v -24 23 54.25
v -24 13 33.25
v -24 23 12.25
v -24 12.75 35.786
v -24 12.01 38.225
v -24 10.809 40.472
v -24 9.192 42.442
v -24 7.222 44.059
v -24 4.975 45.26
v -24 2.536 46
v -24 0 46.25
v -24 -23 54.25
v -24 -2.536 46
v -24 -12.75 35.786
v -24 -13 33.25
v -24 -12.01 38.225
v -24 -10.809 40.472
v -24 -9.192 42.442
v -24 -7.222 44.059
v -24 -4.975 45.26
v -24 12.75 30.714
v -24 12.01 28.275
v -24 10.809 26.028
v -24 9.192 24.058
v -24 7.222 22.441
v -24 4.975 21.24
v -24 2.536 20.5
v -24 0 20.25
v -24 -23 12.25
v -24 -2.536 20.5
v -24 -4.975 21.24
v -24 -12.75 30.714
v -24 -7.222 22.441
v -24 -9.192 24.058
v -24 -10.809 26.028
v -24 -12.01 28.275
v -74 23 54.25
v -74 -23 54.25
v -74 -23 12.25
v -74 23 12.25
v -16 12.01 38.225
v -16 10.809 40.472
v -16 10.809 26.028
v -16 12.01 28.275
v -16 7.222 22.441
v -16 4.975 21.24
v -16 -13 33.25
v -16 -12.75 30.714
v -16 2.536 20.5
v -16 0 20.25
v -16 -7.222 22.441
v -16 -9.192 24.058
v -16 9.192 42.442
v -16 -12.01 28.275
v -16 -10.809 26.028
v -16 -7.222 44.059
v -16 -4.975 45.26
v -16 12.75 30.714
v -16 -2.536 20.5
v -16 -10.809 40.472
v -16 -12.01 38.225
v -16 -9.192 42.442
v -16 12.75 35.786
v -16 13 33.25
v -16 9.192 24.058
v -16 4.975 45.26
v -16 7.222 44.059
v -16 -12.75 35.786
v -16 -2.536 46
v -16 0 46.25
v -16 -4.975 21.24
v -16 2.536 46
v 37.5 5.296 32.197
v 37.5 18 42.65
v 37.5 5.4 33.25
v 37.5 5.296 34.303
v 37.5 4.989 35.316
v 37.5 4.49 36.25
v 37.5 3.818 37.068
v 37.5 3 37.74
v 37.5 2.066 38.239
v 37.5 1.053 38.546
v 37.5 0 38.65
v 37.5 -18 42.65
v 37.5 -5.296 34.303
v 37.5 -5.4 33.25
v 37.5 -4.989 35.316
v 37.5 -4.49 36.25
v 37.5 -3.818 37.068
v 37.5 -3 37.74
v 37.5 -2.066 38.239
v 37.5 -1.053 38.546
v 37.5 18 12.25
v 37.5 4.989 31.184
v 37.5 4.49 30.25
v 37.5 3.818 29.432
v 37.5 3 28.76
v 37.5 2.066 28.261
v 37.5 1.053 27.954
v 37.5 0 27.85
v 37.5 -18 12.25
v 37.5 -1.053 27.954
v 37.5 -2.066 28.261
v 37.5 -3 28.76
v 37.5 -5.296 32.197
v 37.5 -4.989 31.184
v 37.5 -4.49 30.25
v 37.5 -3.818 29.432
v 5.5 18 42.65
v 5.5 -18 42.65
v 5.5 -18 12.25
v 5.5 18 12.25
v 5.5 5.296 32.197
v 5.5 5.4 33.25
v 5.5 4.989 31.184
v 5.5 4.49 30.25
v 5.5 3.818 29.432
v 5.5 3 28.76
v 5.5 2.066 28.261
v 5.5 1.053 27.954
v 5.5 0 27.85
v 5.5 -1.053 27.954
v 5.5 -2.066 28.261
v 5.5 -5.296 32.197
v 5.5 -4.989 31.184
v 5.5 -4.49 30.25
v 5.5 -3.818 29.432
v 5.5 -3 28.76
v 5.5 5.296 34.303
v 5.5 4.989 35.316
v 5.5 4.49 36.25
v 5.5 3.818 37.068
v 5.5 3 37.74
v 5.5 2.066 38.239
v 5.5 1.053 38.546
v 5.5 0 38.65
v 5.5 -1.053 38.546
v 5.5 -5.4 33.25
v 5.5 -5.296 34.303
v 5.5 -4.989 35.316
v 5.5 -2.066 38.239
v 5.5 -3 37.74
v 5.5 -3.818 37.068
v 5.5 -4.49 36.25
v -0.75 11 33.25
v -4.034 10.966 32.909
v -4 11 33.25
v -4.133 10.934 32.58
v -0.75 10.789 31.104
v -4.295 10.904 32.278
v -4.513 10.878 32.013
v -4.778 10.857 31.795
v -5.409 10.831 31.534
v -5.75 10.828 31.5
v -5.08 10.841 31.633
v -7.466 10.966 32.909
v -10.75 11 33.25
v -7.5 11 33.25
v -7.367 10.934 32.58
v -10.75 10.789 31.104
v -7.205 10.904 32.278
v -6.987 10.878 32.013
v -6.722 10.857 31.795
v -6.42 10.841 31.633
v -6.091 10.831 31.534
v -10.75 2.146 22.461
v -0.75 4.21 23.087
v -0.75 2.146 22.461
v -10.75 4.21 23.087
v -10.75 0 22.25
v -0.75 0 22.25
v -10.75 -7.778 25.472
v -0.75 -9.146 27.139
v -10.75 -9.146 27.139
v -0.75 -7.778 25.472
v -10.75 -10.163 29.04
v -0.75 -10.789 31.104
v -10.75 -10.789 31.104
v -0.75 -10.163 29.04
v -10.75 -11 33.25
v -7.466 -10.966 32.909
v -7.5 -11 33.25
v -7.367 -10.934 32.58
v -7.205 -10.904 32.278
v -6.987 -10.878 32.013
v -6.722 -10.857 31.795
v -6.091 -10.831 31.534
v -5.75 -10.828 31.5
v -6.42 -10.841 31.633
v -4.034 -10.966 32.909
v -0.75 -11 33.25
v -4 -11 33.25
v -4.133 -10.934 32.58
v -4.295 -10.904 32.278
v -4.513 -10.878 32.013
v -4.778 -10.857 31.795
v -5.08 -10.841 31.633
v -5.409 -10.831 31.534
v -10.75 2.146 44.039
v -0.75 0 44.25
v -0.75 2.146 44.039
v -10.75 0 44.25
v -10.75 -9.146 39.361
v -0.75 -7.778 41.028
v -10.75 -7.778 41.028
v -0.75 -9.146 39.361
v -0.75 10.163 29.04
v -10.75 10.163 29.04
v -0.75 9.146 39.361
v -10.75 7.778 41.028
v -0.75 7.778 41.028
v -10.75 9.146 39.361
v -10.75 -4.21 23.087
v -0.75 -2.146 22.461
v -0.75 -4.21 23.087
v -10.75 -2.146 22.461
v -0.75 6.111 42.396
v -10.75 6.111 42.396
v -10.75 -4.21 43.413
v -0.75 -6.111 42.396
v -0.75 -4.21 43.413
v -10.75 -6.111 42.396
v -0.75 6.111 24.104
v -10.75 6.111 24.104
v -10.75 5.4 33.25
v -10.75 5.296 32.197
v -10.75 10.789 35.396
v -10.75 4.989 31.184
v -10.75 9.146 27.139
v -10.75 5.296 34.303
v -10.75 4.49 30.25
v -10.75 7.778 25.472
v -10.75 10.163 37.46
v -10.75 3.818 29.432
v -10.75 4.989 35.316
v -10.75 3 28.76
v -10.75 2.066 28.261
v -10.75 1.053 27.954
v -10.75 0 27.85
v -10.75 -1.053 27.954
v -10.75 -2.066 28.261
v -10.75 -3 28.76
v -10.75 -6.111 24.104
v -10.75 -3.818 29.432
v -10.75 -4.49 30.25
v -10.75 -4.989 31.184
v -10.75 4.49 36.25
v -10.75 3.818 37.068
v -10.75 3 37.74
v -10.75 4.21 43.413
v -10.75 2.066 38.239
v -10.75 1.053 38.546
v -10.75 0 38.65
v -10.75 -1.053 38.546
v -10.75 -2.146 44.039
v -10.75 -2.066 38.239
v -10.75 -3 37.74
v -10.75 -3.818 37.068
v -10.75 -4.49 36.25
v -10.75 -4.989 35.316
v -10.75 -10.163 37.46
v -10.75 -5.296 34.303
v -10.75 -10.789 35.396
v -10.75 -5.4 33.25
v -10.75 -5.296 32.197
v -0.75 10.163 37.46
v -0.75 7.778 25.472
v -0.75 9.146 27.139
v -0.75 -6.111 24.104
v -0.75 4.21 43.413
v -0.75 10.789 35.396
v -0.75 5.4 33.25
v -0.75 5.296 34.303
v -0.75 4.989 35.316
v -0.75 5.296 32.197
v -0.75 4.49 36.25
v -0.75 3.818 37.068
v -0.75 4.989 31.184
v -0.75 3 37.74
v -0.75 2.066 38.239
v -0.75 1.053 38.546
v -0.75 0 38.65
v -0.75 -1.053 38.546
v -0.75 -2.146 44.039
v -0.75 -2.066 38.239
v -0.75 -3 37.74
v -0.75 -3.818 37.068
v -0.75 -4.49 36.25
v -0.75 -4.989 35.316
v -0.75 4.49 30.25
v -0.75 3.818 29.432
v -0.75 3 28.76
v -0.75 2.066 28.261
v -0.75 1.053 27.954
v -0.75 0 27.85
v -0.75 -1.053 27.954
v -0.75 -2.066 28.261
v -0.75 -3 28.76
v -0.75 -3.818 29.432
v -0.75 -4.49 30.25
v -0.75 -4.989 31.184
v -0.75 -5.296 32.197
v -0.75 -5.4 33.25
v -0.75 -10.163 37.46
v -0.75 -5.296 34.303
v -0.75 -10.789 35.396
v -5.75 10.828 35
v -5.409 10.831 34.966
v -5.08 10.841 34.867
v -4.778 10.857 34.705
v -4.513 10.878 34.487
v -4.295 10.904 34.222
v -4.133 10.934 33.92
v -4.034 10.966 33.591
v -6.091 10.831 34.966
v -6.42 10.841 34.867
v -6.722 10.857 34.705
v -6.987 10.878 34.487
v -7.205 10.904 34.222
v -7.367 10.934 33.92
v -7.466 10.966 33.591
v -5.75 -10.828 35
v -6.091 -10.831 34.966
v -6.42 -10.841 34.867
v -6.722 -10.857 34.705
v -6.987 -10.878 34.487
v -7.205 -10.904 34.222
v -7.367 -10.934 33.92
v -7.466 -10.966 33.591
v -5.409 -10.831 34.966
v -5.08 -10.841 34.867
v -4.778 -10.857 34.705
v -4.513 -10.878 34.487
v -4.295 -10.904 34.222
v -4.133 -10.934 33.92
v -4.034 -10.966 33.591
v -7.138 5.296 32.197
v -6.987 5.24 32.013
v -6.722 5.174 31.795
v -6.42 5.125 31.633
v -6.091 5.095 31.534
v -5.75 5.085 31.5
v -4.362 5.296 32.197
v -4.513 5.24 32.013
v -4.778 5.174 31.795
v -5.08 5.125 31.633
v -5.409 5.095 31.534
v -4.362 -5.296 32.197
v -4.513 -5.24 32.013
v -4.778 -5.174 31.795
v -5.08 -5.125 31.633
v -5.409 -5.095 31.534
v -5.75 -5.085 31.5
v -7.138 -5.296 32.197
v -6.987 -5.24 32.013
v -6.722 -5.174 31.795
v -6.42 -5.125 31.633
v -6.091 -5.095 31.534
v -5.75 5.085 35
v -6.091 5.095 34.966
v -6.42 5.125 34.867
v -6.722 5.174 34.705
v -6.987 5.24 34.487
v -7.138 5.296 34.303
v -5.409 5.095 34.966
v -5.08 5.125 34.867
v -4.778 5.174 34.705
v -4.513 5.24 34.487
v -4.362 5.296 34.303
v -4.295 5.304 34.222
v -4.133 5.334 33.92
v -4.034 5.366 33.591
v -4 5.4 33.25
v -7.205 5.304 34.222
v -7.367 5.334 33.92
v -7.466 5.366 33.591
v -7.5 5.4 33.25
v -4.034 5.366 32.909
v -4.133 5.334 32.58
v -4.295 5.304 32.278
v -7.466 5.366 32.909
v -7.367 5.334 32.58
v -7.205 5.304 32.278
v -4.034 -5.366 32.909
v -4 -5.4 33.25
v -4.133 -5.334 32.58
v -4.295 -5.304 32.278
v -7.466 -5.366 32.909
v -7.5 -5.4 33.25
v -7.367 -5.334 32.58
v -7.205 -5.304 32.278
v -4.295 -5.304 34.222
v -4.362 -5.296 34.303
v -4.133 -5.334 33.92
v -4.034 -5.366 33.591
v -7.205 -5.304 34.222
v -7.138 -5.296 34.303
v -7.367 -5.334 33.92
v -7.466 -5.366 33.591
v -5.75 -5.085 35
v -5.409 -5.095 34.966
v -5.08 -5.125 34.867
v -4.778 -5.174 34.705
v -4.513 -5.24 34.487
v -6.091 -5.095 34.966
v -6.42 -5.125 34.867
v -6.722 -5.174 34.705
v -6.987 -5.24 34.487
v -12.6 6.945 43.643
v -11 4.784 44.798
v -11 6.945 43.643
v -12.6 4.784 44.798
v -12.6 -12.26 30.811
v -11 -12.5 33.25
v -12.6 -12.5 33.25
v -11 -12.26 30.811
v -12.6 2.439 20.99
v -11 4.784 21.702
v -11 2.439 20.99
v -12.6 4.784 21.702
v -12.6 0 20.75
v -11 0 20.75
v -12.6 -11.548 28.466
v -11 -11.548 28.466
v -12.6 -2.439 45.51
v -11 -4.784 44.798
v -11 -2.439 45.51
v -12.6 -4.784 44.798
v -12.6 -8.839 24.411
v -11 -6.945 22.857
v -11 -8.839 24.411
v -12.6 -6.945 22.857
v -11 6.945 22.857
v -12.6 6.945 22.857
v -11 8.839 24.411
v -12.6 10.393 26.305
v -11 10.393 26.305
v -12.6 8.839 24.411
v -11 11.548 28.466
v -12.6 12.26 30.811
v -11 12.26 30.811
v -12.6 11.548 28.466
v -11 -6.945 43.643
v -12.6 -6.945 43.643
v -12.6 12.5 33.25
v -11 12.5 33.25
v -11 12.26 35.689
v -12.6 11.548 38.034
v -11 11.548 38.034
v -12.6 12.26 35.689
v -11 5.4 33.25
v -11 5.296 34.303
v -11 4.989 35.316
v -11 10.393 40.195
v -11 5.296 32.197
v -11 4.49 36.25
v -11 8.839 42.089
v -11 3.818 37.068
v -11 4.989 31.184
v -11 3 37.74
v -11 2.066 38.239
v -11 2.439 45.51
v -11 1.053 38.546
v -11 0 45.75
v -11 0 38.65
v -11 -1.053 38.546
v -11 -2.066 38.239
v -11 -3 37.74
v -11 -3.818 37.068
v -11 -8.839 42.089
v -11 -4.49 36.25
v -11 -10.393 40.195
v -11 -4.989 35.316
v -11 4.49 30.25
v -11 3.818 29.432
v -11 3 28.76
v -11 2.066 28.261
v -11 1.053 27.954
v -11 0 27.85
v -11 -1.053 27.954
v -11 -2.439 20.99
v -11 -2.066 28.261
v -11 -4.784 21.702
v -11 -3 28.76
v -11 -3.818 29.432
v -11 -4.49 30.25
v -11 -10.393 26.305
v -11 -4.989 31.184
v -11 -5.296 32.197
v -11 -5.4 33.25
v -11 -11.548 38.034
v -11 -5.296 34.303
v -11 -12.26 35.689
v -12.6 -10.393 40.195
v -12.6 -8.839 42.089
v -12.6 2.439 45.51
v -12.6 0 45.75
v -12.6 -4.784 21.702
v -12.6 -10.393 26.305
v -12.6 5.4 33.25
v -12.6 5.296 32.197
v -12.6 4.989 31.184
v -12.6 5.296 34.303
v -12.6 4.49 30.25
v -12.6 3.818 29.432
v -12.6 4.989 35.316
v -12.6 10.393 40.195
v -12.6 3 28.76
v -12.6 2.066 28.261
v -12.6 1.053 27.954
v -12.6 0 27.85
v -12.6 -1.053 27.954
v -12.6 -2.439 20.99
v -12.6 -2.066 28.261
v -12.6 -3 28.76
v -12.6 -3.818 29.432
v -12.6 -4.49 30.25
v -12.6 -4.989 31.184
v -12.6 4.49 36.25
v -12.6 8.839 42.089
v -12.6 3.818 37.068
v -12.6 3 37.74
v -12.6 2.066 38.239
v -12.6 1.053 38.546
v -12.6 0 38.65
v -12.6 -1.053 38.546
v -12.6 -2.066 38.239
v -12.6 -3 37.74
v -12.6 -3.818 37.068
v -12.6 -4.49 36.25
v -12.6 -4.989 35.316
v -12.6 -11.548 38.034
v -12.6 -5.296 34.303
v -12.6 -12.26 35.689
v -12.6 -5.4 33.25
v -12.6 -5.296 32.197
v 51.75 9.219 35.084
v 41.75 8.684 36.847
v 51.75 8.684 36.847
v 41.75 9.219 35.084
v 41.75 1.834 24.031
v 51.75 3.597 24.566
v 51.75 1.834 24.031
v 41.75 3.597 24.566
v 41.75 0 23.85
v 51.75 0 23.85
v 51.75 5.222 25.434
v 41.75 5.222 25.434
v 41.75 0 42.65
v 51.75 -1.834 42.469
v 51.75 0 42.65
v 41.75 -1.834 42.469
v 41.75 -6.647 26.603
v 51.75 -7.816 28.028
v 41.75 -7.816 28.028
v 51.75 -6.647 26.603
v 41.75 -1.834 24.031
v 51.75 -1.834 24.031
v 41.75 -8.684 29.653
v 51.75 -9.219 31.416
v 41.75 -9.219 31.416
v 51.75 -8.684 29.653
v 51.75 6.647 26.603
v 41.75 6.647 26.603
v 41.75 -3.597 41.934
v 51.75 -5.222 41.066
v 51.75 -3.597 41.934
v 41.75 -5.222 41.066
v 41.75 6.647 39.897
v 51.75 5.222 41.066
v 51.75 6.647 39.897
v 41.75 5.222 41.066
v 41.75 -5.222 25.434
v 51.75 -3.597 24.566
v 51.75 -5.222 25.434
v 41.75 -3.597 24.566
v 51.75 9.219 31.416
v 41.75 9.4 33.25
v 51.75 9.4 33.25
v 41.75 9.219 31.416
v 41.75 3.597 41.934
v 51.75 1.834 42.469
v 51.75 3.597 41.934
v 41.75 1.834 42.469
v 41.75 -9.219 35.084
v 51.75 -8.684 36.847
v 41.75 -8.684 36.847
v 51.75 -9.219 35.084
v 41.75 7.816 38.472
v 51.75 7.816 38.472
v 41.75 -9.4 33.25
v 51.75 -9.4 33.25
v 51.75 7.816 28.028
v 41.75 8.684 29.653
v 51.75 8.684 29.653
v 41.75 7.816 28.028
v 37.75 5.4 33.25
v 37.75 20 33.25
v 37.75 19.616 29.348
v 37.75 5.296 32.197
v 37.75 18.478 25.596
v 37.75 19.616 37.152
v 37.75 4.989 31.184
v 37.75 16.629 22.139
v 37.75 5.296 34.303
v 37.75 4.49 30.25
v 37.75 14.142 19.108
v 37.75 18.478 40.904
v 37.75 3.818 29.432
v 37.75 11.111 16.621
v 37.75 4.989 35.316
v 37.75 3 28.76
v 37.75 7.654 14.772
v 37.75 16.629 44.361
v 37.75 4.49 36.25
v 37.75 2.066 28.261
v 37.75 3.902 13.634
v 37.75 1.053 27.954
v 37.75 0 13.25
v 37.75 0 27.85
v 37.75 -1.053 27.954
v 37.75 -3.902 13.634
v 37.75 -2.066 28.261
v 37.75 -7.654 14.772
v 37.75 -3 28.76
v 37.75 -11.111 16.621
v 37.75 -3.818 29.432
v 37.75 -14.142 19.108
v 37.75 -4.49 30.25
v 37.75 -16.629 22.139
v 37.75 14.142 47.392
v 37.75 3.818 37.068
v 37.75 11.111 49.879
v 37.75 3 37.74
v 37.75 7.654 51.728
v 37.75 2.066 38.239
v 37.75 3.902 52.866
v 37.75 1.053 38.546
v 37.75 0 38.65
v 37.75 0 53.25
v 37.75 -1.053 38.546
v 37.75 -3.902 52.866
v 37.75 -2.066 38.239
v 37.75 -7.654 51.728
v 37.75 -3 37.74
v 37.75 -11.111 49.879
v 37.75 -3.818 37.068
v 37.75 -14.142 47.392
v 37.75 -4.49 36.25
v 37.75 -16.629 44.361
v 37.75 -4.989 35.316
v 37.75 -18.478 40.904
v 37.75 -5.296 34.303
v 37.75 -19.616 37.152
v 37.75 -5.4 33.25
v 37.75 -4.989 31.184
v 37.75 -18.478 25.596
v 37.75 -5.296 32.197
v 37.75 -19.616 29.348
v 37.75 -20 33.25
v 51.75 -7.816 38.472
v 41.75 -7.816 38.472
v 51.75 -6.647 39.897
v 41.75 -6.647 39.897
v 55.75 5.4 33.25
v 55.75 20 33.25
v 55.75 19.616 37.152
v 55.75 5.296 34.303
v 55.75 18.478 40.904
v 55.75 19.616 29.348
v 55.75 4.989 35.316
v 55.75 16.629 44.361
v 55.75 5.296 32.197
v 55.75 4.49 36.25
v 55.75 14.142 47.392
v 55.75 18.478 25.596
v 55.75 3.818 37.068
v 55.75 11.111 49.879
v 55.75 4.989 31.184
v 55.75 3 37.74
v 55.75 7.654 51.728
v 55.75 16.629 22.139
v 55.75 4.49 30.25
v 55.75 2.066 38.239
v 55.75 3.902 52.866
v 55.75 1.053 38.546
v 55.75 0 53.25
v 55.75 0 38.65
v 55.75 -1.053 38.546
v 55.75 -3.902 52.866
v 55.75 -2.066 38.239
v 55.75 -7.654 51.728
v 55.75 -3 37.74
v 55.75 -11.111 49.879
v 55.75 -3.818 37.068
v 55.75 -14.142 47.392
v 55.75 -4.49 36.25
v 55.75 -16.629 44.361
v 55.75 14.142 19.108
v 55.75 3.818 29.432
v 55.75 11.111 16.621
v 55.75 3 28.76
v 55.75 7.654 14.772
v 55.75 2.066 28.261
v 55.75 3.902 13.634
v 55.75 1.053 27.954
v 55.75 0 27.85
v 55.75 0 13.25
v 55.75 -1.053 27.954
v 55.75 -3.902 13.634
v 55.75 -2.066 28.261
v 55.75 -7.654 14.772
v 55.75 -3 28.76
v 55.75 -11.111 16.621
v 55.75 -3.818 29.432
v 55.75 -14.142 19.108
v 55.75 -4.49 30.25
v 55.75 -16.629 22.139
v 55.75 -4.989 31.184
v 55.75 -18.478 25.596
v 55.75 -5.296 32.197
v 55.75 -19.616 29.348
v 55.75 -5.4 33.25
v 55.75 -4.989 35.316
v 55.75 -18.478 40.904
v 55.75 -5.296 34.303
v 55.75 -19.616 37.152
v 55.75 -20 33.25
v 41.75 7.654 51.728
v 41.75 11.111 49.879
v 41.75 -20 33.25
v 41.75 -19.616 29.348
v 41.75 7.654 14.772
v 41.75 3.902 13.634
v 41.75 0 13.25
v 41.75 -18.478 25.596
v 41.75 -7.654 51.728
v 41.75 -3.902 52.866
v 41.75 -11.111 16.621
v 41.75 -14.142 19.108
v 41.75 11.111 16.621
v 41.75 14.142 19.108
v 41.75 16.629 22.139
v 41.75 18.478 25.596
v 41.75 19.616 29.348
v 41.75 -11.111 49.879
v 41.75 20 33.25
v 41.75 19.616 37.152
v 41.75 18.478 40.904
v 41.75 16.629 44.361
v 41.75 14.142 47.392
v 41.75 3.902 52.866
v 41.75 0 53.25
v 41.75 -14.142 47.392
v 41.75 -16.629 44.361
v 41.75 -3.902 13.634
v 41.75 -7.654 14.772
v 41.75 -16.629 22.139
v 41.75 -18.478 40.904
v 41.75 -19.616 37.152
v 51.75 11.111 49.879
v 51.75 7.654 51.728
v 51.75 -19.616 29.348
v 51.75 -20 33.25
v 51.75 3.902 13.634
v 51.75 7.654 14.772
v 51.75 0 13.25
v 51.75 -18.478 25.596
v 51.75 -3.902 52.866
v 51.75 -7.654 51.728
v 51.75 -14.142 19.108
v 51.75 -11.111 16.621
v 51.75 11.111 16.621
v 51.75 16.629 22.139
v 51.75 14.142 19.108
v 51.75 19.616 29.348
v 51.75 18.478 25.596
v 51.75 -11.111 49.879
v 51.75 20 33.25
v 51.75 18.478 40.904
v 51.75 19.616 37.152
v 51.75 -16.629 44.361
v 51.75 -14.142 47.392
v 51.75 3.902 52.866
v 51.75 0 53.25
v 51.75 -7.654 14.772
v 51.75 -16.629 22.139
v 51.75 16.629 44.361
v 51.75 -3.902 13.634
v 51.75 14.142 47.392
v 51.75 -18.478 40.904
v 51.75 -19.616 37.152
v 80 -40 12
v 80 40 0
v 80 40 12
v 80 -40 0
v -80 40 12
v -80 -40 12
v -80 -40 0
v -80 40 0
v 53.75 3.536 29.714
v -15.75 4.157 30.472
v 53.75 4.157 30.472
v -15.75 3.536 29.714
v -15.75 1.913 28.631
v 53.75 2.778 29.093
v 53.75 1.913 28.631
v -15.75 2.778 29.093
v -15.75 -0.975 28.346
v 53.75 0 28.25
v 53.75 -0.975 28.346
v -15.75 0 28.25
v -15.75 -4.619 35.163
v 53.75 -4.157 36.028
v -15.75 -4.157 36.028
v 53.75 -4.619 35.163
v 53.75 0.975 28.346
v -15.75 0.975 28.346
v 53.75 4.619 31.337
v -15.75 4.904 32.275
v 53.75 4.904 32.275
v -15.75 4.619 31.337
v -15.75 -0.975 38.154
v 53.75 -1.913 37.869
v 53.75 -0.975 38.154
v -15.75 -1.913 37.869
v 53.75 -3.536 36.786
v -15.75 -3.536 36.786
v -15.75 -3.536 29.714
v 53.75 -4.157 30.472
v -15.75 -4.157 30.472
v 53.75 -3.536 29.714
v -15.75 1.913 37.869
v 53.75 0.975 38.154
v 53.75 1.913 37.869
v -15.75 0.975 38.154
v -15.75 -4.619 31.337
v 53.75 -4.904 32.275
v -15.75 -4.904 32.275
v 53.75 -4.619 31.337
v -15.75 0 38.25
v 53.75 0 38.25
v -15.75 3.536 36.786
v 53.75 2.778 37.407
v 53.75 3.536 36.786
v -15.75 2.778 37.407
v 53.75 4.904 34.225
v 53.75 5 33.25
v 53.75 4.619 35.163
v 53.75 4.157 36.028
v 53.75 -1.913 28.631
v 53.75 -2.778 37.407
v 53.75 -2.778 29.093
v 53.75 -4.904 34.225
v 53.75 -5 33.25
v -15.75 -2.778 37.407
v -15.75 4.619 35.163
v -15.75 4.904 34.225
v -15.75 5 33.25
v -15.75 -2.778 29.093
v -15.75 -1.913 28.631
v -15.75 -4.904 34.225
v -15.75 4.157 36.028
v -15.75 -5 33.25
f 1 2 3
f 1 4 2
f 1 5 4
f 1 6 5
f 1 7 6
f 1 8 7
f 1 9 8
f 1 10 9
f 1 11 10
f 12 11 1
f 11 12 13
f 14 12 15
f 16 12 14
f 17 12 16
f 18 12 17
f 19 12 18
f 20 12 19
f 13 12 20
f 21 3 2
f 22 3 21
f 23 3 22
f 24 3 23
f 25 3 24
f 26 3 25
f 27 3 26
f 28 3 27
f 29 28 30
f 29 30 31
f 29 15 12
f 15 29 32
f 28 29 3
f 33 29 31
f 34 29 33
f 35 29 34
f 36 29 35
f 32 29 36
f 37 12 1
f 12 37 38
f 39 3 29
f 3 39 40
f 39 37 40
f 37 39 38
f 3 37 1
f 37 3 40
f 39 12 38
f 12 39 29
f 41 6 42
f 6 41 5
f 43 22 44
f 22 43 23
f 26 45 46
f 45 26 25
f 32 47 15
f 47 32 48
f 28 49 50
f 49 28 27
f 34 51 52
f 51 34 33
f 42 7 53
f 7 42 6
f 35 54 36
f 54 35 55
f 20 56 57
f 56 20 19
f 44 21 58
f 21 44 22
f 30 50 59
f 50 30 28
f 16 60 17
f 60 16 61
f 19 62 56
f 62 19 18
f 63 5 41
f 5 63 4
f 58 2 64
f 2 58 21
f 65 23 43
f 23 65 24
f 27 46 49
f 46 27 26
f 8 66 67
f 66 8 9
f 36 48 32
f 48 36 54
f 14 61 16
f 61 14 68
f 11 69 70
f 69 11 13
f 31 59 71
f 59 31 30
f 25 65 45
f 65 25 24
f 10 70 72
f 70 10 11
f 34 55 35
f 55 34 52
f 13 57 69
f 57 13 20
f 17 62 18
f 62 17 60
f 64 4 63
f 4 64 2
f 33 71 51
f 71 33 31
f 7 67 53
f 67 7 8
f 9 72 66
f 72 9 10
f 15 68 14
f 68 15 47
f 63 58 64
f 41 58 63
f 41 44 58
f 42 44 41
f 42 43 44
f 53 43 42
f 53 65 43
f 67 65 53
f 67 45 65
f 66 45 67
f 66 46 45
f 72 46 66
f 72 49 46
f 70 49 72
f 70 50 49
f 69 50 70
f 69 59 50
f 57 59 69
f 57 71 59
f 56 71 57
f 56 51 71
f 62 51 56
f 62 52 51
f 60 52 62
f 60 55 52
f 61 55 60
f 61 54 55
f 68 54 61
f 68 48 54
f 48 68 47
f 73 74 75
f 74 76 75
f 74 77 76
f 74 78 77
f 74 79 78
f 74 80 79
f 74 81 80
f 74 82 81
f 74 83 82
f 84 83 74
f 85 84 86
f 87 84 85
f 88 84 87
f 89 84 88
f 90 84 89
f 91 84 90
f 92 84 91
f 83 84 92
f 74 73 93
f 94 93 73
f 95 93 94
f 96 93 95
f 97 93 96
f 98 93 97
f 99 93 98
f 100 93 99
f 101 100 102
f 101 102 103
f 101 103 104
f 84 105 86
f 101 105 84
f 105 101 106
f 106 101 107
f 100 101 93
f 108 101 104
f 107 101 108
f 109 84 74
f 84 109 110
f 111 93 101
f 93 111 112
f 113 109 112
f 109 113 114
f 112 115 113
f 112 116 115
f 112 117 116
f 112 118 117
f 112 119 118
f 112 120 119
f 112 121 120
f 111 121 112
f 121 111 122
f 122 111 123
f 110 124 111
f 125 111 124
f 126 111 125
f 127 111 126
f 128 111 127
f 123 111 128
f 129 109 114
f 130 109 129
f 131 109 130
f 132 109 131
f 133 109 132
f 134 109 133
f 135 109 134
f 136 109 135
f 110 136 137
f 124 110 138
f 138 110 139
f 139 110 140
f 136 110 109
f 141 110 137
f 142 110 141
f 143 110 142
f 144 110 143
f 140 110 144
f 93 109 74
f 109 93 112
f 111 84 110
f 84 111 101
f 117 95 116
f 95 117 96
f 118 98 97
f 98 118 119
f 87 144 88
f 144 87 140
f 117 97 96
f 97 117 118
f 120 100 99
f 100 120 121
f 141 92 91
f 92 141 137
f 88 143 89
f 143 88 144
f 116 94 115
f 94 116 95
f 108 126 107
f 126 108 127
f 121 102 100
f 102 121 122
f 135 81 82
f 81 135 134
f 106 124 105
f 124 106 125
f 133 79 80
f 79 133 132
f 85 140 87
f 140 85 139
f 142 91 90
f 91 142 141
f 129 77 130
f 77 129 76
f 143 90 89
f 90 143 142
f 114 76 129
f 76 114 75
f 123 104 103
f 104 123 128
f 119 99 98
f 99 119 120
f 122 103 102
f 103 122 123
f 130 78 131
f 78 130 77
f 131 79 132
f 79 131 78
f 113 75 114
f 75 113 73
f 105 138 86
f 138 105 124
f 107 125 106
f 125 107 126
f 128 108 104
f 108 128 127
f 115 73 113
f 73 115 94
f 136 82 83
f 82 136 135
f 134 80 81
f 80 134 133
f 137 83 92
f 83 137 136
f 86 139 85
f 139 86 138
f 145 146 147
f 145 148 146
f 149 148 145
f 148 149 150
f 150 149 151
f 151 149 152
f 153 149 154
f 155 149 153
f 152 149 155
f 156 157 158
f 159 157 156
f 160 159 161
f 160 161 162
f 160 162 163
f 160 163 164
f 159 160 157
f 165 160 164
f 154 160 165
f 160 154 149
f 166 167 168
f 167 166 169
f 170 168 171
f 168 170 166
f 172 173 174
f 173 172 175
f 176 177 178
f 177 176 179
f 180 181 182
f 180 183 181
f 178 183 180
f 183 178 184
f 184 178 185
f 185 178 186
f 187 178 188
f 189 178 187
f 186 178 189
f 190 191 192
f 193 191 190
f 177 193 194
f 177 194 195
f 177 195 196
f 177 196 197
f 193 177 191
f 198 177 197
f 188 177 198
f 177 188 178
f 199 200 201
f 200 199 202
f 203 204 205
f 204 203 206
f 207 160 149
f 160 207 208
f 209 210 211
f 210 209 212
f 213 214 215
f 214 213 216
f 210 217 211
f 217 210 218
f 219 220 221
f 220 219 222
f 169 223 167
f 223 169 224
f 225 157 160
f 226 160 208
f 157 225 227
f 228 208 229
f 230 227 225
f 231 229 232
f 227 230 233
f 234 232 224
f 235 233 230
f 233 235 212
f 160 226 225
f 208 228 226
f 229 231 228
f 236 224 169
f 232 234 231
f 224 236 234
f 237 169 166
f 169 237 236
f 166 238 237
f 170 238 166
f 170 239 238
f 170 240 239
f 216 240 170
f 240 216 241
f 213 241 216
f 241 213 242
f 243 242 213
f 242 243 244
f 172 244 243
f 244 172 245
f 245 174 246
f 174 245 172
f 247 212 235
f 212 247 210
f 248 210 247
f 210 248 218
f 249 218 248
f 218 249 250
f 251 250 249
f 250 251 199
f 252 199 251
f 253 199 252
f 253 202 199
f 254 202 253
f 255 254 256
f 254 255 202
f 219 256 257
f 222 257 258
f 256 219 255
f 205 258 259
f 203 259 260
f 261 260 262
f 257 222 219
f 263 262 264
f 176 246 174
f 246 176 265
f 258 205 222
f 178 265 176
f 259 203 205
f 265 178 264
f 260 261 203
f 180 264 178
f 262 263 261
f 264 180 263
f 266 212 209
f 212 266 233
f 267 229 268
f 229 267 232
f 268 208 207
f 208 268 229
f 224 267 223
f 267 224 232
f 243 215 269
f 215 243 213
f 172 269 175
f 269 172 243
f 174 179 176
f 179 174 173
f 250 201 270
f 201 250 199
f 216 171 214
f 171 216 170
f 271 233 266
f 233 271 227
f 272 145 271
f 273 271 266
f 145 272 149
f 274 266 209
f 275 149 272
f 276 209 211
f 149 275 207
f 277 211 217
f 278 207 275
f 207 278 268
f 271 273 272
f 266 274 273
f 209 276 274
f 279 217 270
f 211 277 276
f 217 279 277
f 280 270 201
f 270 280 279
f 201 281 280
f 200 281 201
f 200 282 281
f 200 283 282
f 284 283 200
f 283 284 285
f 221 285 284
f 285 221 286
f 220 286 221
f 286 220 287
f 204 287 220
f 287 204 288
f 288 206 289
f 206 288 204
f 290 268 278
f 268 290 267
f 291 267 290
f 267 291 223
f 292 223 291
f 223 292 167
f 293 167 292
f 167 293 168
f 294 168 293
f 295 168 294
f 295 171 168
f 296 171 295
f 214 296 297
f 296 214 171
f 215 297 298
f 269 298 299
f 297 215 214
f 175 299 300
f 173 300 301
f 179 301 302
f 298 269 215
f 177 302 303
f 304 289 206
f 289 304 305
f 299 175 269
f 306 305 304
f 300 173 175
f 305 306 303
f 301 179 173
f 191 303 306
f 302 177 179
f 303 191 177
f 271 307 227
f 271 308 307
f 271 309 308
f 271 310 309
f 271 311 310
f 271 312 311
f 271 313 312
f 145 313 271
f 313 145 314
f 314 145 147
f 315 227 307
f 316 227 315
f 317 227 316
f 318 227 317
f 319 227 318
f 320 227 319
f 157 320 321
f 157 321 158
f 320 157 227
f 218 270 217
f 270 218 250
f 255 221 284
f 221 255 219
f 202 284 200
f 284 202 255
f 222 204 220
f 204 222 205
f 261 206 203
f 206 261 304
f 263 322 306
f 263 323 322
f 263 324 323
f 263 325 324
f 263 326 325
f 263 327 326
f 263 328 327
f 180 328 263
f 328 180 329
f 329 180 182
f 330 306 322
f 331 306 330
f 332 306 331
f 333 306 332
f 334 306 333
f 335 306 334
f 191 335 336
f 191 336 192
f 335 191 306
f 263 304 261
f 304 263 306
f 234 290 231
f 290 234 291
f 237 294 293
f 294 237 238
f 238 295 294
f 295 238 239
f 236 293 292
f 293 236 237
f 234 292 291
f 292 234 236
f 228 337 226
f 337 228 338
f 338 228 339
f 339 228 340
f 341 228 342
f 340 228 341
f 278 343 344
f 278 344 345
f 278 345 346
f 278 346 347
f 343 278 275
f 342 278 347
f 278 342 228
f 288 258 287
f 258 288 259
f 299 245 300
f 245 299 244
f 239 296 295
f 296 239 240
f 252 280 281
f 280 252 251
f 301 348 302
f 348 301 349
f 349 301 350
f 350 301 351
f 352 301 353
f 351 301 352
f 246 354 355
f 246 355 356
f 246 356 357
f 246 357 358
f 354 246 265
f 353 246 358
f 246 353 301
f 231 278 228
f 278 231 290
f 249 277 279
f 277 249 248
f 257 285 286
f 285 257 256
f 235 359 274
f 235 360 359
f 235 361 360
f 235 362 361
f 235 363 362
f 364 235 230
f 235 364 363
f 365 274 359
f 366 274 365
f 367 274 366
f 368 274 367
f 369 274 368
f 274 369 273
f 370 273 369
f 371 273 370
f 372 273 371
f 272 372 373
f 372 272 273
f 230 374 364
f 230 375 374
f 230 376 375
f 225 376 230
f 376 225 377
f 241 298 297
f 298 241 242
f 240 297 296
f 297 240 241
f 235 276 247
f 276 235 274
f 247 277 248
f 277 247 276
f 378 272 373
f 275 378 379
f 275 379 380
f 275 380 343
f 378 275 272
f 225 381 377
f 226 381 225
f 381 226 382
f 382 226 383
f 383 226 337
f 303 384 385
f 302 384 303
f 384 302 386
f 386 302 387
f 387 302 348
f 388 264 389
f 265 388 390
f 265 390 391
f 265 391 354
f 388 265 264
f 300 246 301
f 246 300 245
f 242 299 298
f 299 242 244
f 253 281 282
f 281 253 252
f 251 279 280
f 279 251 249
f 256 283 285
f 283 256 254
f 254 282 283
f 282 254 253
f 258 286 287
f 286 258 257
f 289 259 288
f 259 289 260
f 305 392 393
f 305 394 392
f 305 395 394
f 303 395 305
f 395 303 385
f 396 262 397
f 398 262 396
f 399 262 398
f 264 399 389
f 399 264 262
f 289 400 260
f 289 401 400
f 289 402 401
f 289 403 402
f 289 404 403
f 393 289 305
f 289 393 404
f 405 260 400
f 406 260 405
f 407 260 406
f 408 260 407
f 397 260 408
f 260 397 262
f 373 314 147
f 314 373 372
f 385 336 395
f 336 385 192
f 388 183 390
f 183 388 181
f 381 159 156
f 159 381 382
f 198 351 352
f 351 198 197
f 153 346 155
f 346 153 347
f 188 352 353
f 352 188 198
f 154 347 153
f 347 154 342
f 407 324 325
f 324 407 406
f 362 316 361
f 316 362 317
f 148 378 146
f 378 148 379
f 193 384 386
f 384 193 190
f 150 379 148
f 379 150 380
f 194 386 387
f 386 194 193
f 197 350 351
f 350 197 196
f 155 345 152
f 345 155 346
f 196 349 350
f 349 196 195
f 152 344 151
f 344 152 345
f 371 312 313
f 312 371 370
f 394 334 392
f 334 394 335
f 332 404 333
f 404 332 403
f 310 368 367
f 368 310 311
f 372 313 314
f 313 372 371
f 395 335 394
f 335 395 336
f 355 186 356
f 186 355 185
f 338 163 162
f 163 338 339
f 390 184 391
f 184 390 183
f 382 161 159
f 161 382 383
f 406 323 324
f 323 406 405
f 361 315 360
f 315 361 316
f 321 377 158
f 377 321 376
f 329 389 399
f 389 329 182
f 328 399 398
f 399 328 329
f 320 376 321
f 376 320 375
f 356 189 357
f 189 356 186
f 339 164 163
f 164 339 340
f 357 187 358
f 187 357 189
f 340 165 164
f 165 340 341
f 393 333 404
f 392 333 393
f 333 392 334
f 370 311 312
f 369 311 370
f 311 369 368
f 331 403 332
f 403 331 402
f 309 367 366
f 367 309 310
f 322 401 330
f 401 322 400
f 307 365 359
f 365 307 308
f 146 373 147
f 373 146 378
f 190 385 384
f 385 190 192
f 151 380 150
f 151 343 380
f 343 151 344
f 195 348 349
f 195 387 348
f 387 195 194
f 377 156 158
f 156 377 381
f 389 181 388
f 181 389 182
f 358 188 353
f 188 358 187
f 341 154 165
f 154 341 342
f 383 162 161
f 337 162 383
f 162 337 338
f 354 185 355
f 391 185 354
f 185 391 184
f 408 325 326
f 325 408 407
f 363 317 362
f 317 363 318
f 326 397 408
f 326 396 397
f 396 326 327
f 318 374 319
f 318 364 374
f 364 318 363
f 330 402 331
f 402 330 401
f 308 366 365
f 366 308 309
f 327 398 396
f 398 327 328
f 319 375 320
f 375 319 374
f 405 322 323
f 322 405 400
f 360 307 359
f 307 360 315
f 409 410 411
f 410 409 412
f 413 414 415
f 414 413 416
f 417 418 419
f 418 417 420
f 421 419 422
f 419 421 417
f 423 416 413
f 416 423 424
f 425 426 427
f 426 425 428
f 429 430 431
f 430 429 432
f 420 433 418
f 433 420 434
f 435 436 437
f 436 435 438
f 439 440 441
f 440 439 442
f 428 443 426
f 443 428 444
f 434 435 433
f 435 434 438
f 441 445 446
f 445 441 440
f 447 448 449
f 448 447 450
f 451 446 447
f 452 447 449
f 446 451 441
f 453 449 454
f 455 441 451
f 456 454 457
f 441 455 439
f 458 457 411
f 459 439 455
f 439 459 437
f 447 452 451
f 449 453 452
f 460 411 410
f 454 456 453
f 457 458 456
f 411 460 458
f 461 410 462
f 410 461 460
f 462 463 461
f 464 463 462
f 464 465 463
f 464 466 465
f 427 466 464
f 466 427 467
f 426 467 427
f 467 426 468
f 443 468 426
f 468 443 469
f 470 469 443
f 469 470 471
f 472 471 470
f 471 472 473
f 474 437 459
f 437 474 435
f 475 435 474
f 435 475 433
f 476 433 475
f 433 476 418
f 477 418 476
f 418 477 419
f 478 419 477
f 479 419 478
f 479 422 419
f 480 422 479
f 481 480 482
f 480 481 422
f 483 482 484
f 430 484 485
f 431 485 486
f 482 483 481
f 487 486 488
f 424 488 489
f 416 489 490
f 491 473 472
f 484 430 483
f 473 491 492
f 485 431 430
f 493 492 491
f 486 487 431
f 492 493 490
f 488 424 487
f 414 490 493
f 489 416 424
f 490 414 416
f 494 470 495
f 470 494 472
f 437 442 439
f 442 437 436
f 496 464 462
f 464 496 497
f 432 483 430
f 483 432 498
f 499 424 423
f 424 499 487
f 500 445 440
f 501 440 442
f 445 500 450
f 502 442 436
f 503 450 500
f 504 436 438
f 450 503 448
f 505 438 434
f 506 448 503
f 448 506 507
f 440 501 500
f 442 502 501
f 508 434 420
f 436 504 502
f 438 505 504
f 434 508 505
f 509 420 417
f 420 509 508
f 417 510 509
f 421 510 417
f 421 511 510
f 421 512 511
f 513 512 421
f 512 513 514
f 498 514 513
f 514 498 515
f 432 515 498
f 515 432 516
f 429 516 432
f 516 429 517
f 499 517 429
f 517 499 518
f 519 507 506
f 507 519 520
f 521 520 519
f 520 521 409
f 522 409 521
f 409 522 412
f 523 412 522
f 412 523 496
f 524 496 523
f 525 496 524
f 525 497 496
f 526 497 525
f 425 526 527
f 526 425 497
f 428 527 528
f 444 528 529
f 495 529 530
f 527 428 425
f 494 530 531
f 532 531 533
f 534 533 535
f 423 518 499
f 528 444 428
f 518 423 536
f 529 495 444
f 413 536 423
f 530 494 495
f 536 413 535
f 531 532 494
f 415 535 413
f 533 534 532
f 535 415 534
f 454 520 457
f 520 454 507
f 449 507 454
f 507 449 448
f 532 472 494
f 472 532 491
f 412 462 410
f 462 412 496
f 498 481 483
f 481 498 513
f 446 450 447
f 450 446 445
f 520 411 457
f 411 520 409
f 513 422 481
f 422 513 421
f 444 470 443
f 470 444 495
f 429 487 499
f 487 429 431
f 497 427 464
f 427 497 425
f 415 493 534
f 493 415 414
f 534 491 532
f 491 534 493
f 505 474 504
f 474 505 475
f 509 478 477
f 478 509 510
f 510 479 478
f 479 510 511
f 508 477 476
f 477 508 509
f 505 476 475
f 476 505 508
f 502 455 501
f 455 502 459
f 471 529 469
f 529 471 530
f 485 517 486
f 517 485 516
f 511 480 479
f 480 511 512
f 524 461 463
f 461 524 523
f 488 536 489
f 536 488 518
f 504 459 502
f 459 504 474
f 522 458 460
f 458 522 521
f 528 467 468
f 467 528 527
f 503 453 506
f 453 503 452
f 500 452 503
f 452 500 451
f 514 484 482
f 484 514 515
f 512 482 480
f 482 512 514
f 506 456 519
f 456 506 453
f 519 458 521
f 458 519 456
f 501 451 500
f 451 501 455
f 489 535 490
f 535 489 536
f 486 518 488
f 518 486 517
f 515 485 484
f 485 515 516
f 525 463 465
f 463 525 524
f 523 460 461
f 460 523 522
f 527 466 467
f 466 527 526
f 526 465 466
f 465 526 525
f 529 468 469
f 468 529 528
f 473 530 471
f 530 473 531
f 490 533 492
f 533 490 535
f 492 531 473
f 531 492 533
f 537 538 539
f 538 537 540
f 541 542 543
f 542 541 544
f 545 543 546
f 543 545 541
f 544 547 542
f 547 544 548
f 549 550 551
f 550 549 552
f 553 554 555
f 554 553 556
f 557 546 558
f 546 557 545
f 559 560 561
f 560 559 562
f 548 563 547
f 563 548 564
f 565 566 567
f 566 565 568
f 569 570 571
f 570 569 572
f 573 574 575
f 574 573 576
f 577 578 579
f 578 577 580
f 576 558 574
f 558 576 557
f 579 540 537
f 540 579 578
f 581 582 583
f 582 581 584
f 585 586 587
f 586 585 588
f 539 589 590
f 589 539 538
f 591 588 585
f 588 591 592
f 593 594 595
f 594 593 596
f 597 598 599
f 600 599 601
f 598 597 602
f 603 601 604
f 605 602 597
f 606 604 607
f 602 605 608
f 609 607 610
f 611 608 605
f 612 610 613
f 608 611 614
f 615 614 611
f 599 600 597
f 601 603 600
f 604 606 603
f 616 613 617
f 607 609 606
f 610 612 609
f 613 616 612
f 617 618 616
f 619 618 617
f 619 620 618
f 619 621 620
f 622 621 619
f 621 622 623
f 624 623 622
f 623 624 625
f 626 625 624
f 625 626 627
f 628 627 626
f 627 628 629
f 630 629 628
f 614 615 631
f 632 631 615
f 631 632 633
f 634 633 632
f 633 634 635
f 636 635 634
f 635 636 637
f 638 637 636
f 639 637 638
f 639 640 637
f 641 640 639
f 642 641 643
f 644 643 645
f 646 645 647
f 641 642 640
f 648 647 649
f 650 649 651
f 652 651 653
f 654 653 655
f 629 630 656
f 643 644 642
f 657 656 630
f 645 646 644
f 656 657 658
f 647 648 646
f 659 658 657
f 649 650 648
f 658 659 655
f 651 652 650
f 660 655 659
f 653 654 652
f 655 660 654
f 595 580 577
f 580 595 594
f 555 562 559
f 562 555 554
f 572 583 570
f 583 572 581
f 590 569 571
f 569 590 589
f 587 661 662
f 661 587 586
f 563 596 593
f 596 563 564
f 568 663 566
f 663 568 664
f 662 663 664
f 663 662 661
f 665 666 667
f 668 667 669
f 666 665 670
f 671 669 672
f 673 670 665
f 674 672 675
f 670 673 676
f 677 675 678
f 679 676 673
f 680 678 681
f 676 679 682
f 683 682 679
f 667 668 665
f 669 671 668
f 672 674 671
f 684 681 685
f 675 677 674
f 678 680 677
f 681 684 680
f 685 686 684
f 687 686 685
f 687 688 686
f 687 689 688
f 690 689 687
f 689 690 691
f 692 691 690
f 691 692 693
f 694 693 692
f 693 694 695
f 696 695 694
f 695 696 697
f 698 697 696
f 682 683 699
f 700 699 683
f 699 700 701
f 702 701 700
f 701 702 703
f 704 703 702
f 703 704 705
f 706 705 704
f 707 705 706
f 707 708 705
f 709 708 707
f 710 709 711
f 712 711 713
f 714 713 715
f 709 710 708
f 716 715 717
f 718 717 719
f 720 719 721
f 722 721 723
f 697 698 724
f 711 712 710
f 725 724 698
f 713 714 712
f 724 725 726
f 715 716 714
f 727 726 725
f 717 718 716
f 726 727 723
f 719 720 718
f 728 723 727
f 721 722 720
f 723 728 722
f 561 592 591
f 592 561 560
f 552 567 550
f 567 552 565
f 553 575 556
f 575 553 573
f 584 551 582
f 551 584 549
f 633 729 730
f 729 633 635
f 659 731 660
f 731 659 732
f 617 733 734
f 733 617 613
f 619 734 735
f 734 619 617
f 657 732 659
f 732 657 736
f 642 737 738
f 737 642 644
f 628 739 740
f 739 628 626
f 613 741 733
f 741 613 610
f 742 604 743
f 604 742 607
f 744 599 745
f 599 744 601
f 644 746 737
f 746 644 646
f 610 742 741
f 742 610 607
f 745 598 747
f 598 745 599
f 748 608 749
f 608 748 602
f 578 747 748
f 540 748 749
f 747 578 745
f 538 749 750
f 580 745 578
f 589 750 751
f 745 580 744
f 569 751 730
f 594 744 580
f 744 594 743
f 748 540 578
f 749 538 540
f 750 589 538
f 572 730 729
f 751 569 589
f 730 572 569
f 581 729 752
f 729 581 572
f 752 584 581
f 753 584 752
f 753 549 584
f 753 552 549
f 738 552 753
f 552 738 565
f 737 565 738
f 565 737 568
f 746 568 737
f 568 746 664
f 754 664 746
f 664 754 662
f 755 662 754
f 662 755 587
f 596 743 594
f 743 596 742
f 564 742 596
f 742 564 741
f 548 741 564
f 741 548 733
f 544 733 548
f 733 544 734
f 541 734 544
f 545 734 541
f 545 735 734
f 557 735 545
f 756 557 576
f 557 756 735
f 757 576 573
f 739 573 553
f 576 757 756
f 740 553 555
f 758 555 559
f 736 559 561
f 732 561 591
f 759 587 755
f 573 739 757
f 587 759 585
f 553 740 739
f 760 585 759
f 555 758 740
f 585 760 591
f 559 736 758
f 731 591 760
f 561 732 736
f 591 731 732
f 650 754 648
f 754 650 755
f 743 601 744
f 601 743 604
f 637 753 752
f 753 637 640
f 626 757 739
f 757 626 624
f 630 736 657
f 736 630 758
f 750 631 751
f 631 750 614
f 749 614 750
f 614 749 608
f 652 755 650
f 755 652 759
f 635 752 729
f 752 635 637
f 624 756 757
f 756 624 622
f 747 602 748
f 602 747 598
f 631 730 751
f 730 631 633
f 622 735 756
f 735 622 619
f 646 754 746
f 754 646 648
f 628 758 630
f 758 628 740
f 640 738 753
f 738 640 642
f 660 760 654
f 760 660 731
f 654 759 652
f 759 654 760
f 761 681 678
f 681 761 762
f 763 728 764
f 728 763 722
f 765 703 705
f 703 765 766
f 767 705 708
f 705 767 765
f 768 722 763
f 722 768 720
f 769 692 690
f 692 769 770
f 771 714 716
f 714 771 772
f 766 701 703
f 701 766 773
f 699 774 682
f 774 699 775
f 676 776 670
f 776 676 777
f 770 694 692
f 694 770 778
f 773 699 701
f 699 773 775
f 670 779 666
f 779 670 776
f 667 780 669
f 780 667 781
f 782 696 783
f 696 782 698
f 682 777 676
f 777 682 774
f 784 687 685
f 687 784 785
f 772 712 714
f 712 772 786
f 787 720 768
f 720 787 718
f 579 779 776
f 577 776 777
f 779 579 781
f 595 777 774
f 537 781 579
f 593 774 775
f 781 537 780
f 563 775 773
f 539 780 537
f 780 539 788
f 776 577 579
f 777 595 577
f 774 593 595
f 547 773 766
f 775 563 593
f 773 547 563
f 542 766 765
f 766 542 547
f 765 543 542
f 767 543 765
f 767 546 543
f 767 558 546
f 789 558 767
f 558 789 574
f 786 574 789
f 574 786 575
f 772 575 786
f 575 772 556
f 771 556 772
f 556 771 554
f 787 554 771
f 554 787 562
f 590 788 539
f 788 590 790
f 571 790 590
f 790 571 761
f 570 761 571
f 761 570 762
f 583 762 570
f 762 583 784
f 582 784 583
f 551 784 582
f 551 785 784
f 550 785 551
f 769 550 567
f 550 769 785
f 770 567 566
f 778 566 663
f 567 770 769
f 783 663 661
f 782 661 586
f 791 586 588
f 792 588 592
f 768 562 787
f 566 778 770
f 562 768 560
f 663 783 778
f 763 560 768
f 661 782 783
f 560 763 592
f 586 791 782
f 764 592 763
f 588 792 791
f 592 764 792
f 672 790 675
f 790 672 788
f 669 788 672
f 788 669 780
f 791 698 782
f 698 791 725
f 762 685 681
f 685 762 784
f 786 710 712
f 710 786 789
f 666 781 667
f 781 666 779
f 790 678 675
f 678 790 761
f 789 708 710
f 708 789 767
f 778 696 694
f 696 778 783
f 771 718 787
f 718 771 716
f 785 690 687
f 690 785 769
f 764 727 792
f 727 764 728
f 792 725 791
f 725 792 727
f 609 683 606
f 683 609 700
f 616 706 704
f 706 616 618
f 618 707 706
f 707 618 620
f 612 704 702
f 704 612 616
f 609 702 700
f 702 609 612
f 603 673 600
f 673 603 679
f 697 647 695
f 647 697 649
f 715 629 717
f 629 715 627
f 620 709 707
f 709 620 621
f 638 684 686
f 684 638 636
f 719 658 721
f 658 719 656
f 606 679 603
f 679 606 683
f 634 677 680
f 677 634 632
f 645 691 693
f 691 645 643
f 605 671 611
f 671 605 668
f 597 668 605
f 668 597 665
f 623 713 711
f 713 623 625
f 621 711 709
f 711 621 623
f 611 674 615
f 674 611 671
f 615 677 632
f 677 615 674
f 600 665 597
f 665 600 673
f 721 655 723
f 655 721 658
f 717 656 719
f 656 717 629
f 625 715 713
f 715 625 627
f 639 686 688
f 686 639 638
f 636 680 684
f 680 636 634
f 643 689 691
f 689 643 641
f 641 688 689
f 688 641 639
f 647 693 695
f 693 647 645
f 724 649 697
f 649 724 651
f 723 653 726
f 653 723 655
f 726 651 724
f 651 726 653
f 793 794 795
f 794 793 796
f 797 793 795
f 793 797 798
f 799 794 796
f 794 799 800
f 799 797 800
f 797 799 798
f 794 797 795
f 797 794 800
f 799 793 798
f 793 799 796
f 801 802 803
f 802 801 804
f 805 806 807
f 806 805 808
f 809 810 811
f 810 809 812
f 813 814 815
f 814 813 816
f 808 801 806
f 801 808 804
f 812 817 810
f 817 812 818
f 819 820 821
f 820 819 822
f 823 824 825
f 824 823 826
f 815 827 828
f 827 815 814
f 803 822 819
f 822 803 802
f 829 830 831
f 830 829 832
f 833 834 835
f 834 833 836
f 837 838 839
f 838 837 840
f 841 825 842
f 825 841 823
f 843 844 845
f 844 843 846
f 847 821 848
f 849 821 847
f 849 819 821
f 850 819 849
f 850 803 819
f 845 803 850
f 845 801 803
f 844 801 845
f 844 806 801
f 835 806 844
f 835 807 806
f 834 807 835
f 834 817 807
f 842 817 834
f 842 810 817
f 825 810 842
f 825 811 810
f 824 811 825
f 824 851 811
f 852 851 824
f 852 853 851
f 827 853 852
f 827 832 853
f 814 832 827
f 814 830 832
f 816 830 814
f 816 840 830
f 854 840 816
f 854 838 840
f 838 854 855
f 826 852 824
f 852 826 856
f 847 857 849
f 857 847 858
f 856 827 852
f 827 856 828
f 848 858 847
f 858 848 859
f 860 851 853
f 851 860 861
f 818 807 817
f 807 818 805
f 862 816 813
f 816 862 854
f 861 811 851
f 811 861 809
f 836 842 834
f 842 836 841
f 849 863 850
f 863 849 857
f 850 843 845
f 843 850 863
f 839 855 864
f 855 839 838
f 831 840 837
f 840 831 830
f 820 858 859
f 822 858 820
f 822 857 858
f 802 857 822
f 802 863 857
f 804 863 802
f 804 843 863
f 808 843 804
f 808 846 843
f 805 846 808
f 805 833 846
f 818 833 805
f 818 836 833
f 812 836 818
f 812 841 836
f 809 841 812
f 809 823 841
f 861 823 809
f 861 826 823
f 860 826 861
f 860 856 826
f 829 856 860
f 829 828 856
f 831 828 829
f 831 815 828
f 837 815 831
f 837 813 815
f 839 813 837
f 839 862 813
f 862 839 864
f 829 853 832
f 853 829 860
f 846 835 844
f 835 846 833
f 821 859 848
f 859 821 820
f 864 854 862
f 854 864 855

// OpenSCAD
$fn = 32;

// ------------------------------------------------------------------------
// Motor drive station: motor 50 x 42 mm, shaft d10, pulley d40
// Every part is its own module, assembly() places every instance.
// ------------------------------------------------------------------------

// --- part 1 ---
module station_bed() {
  difference() {
    translate([-80, -40, 0]) cube([160, 80, 12]);
  }
}

// --- part 2 ---
module drive_motor() {
  union() {
    translate([-25, -23, 0]) cube([50, 46, 42]);
    translate([29, 0, 21]) rotate([0, 90, 0]) cylinder(h = 8, d = 26, center = true);
  }
}

// --- part 3 ---
module pillow_block() {
  difference() {
    translate([-16, -18, 0]) cube([32, 36, 30.4]);
    translate([0, 0, 21]) rotate([0, 90, 0]) cylinder(h = 34, d = 10.8, center = true);
  }
}

// --- part 4 ---
module drive_shaft() {
  translate([0, 0, -34.75]) cylinder(h = 69.5, d = 10);
}

// --- part 5 ---
module shaft_collar() {
  difference() {
    cylinder(h = 10, d = 22);
    translate([0, 0, -1]) cylinder(h = 12, d = 10.8);
    translate([0, 0, 5]) rotate([90, 0, 0]) cylinder(h = 24, d = 3.5, center = true);
  }
}

// --- part 6 ---
module collar_washer() {
  difference() {
      translate([0, 0, 0]) cylinder(h = 1.6, d = 25);
      translate([0, 0, -1]) cylinder(h = 3.6, d = 10.8);
    }
}

// --- part 7 ---
module drive_pulley() {
  difference() {
    union() {
      cylinder(h = 18, d = 18.8);
      cylinder(h = 4, d = 40);
      translate([0, 0, 14]) cylinder(h = 4, d = 40);
    }
    translate([0, 0, -1]) cylinder(h = 20, d = 10.8);
  }
}

// --- assembly ---
module assembly() {
  color([0.80, 0.24, 0.20]) translate([0, 0, 0]) rotate([0, 0, 0]) station_bed();
  color([0.20, 0.45, 0.75]) translate([-49, 0, 12.25]) rotate([0, 0, 0]) drive_motor();
  color([0.25, 0.62, 0.32]) translate([21.5, 0, 12.25]) rotate([0, 0, 0]) pillow_block();
  color([0.92, 0.70, 0.18]) translate([19, 0, 33.25]) rotate([0, 90, 0]) drive_shaft();
  color([0.58, 0.35, 0.70]) translate([-10.75, 0, 33.25]) rotate([0, 90, 0]) shaft_collar();
  color([0.16, 0.66, 0.66]) translate([-12.6, 0, 33.25]) rotate([0, 90, 0]) collar_washer();
  color([0.85, 0.48, 0.18]) translate([37.75, 0, 33.25]) rotate([0, 90, 0]) drive_pulley();
}

assembly();
